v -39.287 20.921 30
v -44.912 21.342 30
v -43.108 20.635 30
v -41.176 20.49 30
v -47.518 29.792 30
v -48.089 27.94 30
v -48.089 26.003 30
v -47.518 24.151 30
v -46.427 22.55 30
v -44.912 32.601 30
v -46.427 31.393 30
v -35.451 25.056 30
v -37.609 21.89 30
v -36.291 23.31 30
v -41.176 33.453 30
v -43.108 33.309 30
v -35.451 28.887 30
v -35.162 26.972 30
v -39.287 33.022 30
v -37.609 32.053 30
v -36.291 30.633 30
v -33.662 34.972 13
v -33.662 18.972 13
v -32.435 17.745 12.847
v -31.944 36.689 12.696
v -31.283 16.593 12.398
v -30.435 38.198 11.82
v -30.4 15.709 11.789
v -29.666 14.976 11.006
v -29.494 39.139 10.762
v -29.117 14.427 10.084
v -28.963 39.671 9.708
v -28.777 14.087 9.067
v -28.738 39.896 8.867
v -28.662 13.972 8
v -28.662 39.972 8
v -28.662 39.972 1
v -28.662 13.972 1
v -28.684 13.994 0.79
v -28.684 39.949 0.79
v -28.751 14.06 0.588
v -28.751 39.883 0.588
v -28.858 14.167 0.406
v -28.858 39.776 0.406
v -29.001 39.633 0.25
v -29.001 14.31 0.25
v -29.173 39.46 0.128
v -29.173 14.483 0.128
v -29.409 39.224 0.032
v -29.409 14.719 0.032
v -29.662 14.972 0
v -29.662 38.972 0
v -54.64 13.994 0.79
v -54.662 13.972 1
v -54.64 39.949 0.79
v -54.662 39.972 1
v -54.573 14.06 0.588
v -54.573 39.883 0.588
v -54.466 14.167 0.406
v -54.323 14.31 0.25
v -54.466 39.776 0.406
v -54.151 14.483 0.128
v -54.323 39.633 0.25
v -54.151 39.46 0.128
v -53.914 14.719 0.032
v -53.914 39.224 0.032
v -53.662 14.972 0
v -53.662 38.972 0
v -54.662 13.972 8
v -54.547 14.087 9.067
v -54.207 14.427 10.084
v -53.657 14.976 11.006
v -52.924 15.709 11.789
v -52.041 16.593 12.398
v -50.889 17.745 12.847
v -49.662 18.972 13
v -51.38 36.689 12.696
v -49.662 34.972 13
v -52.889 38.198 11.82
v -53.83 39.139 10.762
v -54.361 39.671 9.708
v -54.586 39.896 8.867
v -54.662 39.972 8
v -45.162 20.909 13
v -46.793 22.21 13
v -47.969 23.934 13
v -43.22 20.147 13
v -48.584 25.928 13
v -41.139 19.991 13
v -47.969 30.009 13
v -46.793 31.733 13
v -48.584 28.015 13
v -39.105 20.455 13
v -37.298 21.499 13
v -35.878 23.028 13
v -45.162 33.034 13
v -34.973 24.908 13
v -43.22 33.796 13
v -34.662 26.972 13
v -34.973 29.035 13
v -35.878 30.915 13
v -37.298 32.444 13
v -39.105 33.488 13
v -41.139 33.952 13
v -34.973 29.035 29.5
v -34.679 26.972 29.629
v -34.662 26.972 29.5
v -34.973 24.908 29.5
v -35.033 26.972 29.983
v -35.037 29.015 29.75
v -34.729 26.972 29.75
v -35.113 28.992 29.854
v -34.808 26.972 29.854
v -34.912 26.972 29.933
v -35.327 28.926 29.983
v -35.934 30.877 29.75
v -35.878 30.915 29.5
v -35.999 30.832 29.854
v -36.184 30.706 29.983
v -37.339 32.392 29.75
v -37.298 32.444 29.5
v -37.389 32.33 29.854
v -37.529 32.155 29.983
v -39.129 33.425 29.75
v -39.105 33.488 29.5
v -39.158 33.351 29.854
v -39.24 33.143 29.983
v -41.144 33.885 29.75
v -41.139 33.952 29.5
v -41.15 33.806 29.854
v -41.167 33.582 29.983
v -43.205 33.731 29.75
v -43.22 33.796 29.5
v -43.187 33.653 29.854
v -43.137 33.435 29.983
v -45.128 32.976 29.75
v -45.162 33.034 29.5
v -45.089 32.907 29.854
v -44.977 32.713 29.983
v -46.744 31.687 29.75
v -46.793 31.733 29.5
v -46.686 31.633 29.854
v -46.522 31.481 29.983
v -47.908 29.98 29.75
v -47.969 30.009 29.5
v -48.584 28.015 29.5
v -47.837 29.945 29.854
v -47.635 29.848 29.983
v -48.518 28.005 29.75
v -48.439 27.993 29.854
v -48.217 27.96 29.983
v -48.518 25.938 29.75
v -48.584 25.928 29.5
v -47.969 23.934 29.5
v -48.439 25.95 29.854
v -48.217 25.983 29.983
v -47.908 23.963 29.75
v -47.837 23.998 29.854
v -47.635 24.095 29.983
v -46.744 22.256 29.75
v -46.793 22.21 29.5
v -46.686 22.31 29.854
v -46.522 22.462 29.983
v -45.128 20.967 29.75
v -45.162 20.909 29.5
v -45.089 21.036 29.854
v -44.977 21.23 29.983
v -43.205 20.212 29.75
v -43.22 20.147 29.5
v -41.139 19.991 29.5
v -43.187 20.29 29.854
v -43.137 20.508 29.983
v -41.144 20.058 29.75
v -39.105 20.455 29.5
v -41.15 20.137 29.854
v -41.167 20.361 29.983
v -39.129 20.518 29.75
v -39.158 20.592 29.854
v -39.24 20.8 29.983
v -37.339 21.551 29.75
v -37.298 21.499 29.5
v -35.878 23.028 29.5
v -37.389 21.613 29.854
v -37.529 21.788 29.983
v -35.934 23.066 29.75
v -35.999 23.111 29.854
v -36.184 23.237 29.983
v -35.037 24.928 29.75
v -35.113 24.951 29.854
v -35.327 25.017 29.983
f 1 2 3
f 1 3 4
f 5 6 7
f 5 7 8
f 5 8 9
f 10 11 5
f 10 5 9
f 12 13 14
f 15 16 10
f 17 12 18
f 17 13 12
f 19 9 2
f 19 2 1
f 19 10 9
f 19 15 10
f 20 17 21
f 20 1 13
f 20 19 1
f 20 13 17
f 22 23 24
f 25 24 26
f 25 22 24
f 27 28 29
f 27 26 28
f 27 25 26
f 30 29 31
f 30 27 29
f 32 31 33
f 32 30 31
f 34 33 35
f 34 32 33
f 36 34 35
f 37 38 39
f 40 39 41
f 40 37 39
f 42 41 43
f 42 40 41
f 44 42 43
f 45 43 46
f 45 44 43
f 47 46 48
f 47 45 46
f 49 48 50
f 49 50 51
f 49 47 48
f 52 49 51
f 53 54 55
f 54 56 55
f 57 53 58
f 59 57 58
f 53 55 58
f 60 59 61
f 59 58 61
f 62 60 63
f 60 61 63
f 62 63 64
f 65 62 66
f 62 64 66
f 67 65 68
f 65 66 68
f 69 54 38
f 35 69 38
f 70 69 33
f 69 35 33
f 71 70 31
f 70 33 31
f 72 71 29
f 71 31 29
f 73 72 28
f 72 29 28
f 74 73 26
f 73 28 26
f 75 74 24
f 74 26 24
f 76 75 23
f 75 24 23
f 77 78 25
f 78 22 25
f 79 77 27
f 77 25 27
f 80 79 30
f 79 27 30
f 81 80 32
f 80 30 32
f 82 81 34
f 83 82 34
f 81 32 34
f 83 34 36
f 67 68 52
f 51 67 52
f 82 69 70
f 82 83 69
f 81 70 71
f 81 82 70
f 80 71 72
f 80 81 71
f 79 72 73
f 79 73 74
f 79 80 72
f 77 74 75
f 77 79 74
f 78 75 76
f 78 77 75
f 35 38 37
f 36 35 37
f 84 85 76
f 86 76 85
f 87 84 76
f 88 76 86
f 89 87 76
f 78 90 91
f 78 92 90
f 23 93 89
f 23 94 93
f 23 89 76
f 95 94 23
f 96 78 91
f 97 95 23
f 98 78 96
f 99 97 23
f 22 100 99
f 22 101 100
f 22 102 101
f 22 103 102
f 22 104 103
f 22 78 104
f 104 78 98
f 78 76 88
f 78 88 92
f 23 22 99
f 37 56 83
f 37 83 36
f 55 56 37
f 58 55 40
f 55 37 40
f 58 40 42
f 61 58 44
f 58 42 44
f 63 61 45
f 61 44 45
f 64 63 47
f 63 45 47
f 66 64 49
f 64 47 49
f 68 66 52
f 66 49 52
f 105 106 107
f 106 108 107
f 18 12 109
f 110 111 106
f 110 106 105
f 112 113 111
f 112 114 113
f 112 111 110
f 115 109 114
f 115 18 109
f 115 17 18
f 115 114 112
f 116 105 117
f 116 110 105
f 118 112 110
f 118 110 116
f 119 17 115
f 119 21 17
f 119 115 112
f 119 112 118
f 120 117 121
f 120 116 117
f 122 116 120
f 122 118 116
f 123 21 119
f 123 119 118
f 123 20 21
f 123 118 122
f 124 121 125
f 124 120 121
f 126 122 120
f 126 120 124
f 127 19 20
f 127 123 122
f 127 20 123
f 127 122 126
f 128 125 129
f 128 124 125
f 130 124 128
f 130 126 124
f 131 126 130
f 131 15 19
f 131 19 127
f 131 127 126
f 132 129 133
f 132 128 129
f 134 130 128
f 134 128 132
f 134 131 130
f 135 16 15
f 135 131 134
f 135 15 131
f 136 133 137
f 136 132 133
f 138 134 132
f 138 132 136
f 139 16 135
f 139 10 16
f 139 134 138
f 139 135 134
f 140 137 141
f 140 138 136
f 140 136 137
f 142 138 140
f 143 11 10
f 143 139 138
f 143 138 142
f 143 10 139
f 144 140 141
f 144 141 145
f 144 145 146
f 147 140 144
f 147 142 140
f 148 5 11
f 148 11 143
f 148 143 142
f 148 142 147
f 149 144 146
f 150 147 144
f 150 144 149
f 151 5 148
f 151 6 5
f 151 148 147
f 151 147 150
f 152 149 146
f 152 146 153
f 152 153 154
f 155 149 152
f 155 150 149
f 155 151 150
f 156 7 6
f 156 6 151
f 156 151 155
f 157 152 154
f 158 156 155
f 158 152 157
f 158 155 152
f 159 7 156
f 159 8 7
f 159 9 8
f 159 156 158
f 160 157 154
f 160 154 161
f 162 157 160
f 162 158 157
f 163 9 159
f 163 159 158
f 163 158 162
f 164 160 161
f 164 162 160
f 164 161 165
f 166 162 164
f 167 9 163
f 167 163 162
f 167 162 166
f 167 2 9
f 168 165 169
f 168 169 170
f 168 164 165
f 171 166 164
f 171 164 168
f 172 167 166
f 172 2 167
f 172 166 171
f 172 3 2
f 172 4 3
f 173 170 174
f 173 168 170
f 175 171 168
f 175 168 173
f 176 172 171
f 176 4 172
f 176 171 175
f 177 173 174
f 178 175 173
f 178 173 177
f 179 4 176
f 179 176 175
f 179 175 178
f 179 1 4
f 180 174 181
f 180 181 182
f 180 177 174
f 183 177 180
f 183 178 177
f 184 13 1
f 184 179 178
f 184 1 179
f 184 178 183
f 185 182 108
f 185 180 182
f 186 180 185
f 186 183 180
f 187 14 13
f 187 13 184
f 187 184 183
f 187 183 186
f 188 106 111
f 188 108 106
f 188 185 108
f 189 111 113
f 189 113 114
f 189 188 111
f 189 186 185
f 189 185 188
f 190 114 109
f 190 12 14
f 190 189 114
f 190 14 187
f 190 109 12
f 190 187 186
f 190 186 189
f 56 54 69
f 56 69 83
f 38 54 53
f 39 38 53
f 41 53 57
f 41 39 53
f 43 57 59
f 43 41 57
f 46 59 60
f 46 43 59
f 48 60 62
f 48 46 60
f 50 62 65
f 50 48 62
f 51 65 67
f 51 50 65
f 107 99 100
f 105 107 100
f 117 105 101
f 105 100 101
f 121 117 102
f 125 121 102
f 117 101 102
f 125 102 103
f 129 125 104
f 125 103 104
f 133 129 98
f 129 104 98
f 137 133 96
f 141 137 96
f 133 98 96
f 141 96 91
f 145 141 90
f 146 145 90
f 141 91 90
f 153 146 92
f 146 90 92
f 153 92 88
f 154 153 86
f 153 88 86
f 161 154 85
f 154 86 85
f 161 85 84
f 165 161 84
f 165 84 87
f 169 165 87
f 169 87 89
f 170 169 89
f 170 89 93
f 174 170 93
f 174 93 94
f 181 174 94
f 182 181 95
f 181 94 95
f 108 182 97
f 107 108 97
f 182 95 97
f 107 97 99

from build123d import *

# Parameters (mm, degrees)
F0_W     = 26
F0_H     = 26
F1_DEPTH = 13
F2_R     = 1
F3_R     = 5
F4_R     = 7
F5_DEPTH = 17
F6_R     = 0.5


with BuildPart() as f1:
    # F0 (on Top) → F1 (new body)
    with BuildSketch(Plane.XY):
        with Locations((-41.661934, 26.971549)):
            Rectangle(F0_W, F0_H)
    extrude(amount=F1_DEPTH)

    # F2
    f2_edges = [f1.edges().sort_by_distance(p)[0] for p in [
        (-28.661934, 26.971549, 0),
        (-41.661934, 39.971549, 0),
        (-54.661934, 26.971549, 0),
        (-41.661934, 13.971549, 0),
    ]]
    fillet(f2_edges, radius=F2_R)

    # F3
    f3_edges = [f1.edges().sort_by_distance(p)[0] for p in [
        (-41.661934, 39.971549, 13),
        (-54.661934, 26.971549, 13),
        (-41.661934, 13.971549, 13),
        (-28.661934, 26.971549, 13),
    ]]
    fillet(f3_edges, radius=F3_R)

    # F4 (on face) → F5 (join)
    with BuildSketch(Plane.XY.offset(13)):
        with Locations((-41.661934, 26.971549)):
            Circle(F4_R)
    extrude(amount=F5_DEPTH)

    # F6
    f6_edges = [f1.edges().sort_by_distance(p)[0] for p in [
        (-48.661934, 26.971549, 30),
    ]]
    fillet(f6_edges, radius=F6_R)


solid = f1.part
